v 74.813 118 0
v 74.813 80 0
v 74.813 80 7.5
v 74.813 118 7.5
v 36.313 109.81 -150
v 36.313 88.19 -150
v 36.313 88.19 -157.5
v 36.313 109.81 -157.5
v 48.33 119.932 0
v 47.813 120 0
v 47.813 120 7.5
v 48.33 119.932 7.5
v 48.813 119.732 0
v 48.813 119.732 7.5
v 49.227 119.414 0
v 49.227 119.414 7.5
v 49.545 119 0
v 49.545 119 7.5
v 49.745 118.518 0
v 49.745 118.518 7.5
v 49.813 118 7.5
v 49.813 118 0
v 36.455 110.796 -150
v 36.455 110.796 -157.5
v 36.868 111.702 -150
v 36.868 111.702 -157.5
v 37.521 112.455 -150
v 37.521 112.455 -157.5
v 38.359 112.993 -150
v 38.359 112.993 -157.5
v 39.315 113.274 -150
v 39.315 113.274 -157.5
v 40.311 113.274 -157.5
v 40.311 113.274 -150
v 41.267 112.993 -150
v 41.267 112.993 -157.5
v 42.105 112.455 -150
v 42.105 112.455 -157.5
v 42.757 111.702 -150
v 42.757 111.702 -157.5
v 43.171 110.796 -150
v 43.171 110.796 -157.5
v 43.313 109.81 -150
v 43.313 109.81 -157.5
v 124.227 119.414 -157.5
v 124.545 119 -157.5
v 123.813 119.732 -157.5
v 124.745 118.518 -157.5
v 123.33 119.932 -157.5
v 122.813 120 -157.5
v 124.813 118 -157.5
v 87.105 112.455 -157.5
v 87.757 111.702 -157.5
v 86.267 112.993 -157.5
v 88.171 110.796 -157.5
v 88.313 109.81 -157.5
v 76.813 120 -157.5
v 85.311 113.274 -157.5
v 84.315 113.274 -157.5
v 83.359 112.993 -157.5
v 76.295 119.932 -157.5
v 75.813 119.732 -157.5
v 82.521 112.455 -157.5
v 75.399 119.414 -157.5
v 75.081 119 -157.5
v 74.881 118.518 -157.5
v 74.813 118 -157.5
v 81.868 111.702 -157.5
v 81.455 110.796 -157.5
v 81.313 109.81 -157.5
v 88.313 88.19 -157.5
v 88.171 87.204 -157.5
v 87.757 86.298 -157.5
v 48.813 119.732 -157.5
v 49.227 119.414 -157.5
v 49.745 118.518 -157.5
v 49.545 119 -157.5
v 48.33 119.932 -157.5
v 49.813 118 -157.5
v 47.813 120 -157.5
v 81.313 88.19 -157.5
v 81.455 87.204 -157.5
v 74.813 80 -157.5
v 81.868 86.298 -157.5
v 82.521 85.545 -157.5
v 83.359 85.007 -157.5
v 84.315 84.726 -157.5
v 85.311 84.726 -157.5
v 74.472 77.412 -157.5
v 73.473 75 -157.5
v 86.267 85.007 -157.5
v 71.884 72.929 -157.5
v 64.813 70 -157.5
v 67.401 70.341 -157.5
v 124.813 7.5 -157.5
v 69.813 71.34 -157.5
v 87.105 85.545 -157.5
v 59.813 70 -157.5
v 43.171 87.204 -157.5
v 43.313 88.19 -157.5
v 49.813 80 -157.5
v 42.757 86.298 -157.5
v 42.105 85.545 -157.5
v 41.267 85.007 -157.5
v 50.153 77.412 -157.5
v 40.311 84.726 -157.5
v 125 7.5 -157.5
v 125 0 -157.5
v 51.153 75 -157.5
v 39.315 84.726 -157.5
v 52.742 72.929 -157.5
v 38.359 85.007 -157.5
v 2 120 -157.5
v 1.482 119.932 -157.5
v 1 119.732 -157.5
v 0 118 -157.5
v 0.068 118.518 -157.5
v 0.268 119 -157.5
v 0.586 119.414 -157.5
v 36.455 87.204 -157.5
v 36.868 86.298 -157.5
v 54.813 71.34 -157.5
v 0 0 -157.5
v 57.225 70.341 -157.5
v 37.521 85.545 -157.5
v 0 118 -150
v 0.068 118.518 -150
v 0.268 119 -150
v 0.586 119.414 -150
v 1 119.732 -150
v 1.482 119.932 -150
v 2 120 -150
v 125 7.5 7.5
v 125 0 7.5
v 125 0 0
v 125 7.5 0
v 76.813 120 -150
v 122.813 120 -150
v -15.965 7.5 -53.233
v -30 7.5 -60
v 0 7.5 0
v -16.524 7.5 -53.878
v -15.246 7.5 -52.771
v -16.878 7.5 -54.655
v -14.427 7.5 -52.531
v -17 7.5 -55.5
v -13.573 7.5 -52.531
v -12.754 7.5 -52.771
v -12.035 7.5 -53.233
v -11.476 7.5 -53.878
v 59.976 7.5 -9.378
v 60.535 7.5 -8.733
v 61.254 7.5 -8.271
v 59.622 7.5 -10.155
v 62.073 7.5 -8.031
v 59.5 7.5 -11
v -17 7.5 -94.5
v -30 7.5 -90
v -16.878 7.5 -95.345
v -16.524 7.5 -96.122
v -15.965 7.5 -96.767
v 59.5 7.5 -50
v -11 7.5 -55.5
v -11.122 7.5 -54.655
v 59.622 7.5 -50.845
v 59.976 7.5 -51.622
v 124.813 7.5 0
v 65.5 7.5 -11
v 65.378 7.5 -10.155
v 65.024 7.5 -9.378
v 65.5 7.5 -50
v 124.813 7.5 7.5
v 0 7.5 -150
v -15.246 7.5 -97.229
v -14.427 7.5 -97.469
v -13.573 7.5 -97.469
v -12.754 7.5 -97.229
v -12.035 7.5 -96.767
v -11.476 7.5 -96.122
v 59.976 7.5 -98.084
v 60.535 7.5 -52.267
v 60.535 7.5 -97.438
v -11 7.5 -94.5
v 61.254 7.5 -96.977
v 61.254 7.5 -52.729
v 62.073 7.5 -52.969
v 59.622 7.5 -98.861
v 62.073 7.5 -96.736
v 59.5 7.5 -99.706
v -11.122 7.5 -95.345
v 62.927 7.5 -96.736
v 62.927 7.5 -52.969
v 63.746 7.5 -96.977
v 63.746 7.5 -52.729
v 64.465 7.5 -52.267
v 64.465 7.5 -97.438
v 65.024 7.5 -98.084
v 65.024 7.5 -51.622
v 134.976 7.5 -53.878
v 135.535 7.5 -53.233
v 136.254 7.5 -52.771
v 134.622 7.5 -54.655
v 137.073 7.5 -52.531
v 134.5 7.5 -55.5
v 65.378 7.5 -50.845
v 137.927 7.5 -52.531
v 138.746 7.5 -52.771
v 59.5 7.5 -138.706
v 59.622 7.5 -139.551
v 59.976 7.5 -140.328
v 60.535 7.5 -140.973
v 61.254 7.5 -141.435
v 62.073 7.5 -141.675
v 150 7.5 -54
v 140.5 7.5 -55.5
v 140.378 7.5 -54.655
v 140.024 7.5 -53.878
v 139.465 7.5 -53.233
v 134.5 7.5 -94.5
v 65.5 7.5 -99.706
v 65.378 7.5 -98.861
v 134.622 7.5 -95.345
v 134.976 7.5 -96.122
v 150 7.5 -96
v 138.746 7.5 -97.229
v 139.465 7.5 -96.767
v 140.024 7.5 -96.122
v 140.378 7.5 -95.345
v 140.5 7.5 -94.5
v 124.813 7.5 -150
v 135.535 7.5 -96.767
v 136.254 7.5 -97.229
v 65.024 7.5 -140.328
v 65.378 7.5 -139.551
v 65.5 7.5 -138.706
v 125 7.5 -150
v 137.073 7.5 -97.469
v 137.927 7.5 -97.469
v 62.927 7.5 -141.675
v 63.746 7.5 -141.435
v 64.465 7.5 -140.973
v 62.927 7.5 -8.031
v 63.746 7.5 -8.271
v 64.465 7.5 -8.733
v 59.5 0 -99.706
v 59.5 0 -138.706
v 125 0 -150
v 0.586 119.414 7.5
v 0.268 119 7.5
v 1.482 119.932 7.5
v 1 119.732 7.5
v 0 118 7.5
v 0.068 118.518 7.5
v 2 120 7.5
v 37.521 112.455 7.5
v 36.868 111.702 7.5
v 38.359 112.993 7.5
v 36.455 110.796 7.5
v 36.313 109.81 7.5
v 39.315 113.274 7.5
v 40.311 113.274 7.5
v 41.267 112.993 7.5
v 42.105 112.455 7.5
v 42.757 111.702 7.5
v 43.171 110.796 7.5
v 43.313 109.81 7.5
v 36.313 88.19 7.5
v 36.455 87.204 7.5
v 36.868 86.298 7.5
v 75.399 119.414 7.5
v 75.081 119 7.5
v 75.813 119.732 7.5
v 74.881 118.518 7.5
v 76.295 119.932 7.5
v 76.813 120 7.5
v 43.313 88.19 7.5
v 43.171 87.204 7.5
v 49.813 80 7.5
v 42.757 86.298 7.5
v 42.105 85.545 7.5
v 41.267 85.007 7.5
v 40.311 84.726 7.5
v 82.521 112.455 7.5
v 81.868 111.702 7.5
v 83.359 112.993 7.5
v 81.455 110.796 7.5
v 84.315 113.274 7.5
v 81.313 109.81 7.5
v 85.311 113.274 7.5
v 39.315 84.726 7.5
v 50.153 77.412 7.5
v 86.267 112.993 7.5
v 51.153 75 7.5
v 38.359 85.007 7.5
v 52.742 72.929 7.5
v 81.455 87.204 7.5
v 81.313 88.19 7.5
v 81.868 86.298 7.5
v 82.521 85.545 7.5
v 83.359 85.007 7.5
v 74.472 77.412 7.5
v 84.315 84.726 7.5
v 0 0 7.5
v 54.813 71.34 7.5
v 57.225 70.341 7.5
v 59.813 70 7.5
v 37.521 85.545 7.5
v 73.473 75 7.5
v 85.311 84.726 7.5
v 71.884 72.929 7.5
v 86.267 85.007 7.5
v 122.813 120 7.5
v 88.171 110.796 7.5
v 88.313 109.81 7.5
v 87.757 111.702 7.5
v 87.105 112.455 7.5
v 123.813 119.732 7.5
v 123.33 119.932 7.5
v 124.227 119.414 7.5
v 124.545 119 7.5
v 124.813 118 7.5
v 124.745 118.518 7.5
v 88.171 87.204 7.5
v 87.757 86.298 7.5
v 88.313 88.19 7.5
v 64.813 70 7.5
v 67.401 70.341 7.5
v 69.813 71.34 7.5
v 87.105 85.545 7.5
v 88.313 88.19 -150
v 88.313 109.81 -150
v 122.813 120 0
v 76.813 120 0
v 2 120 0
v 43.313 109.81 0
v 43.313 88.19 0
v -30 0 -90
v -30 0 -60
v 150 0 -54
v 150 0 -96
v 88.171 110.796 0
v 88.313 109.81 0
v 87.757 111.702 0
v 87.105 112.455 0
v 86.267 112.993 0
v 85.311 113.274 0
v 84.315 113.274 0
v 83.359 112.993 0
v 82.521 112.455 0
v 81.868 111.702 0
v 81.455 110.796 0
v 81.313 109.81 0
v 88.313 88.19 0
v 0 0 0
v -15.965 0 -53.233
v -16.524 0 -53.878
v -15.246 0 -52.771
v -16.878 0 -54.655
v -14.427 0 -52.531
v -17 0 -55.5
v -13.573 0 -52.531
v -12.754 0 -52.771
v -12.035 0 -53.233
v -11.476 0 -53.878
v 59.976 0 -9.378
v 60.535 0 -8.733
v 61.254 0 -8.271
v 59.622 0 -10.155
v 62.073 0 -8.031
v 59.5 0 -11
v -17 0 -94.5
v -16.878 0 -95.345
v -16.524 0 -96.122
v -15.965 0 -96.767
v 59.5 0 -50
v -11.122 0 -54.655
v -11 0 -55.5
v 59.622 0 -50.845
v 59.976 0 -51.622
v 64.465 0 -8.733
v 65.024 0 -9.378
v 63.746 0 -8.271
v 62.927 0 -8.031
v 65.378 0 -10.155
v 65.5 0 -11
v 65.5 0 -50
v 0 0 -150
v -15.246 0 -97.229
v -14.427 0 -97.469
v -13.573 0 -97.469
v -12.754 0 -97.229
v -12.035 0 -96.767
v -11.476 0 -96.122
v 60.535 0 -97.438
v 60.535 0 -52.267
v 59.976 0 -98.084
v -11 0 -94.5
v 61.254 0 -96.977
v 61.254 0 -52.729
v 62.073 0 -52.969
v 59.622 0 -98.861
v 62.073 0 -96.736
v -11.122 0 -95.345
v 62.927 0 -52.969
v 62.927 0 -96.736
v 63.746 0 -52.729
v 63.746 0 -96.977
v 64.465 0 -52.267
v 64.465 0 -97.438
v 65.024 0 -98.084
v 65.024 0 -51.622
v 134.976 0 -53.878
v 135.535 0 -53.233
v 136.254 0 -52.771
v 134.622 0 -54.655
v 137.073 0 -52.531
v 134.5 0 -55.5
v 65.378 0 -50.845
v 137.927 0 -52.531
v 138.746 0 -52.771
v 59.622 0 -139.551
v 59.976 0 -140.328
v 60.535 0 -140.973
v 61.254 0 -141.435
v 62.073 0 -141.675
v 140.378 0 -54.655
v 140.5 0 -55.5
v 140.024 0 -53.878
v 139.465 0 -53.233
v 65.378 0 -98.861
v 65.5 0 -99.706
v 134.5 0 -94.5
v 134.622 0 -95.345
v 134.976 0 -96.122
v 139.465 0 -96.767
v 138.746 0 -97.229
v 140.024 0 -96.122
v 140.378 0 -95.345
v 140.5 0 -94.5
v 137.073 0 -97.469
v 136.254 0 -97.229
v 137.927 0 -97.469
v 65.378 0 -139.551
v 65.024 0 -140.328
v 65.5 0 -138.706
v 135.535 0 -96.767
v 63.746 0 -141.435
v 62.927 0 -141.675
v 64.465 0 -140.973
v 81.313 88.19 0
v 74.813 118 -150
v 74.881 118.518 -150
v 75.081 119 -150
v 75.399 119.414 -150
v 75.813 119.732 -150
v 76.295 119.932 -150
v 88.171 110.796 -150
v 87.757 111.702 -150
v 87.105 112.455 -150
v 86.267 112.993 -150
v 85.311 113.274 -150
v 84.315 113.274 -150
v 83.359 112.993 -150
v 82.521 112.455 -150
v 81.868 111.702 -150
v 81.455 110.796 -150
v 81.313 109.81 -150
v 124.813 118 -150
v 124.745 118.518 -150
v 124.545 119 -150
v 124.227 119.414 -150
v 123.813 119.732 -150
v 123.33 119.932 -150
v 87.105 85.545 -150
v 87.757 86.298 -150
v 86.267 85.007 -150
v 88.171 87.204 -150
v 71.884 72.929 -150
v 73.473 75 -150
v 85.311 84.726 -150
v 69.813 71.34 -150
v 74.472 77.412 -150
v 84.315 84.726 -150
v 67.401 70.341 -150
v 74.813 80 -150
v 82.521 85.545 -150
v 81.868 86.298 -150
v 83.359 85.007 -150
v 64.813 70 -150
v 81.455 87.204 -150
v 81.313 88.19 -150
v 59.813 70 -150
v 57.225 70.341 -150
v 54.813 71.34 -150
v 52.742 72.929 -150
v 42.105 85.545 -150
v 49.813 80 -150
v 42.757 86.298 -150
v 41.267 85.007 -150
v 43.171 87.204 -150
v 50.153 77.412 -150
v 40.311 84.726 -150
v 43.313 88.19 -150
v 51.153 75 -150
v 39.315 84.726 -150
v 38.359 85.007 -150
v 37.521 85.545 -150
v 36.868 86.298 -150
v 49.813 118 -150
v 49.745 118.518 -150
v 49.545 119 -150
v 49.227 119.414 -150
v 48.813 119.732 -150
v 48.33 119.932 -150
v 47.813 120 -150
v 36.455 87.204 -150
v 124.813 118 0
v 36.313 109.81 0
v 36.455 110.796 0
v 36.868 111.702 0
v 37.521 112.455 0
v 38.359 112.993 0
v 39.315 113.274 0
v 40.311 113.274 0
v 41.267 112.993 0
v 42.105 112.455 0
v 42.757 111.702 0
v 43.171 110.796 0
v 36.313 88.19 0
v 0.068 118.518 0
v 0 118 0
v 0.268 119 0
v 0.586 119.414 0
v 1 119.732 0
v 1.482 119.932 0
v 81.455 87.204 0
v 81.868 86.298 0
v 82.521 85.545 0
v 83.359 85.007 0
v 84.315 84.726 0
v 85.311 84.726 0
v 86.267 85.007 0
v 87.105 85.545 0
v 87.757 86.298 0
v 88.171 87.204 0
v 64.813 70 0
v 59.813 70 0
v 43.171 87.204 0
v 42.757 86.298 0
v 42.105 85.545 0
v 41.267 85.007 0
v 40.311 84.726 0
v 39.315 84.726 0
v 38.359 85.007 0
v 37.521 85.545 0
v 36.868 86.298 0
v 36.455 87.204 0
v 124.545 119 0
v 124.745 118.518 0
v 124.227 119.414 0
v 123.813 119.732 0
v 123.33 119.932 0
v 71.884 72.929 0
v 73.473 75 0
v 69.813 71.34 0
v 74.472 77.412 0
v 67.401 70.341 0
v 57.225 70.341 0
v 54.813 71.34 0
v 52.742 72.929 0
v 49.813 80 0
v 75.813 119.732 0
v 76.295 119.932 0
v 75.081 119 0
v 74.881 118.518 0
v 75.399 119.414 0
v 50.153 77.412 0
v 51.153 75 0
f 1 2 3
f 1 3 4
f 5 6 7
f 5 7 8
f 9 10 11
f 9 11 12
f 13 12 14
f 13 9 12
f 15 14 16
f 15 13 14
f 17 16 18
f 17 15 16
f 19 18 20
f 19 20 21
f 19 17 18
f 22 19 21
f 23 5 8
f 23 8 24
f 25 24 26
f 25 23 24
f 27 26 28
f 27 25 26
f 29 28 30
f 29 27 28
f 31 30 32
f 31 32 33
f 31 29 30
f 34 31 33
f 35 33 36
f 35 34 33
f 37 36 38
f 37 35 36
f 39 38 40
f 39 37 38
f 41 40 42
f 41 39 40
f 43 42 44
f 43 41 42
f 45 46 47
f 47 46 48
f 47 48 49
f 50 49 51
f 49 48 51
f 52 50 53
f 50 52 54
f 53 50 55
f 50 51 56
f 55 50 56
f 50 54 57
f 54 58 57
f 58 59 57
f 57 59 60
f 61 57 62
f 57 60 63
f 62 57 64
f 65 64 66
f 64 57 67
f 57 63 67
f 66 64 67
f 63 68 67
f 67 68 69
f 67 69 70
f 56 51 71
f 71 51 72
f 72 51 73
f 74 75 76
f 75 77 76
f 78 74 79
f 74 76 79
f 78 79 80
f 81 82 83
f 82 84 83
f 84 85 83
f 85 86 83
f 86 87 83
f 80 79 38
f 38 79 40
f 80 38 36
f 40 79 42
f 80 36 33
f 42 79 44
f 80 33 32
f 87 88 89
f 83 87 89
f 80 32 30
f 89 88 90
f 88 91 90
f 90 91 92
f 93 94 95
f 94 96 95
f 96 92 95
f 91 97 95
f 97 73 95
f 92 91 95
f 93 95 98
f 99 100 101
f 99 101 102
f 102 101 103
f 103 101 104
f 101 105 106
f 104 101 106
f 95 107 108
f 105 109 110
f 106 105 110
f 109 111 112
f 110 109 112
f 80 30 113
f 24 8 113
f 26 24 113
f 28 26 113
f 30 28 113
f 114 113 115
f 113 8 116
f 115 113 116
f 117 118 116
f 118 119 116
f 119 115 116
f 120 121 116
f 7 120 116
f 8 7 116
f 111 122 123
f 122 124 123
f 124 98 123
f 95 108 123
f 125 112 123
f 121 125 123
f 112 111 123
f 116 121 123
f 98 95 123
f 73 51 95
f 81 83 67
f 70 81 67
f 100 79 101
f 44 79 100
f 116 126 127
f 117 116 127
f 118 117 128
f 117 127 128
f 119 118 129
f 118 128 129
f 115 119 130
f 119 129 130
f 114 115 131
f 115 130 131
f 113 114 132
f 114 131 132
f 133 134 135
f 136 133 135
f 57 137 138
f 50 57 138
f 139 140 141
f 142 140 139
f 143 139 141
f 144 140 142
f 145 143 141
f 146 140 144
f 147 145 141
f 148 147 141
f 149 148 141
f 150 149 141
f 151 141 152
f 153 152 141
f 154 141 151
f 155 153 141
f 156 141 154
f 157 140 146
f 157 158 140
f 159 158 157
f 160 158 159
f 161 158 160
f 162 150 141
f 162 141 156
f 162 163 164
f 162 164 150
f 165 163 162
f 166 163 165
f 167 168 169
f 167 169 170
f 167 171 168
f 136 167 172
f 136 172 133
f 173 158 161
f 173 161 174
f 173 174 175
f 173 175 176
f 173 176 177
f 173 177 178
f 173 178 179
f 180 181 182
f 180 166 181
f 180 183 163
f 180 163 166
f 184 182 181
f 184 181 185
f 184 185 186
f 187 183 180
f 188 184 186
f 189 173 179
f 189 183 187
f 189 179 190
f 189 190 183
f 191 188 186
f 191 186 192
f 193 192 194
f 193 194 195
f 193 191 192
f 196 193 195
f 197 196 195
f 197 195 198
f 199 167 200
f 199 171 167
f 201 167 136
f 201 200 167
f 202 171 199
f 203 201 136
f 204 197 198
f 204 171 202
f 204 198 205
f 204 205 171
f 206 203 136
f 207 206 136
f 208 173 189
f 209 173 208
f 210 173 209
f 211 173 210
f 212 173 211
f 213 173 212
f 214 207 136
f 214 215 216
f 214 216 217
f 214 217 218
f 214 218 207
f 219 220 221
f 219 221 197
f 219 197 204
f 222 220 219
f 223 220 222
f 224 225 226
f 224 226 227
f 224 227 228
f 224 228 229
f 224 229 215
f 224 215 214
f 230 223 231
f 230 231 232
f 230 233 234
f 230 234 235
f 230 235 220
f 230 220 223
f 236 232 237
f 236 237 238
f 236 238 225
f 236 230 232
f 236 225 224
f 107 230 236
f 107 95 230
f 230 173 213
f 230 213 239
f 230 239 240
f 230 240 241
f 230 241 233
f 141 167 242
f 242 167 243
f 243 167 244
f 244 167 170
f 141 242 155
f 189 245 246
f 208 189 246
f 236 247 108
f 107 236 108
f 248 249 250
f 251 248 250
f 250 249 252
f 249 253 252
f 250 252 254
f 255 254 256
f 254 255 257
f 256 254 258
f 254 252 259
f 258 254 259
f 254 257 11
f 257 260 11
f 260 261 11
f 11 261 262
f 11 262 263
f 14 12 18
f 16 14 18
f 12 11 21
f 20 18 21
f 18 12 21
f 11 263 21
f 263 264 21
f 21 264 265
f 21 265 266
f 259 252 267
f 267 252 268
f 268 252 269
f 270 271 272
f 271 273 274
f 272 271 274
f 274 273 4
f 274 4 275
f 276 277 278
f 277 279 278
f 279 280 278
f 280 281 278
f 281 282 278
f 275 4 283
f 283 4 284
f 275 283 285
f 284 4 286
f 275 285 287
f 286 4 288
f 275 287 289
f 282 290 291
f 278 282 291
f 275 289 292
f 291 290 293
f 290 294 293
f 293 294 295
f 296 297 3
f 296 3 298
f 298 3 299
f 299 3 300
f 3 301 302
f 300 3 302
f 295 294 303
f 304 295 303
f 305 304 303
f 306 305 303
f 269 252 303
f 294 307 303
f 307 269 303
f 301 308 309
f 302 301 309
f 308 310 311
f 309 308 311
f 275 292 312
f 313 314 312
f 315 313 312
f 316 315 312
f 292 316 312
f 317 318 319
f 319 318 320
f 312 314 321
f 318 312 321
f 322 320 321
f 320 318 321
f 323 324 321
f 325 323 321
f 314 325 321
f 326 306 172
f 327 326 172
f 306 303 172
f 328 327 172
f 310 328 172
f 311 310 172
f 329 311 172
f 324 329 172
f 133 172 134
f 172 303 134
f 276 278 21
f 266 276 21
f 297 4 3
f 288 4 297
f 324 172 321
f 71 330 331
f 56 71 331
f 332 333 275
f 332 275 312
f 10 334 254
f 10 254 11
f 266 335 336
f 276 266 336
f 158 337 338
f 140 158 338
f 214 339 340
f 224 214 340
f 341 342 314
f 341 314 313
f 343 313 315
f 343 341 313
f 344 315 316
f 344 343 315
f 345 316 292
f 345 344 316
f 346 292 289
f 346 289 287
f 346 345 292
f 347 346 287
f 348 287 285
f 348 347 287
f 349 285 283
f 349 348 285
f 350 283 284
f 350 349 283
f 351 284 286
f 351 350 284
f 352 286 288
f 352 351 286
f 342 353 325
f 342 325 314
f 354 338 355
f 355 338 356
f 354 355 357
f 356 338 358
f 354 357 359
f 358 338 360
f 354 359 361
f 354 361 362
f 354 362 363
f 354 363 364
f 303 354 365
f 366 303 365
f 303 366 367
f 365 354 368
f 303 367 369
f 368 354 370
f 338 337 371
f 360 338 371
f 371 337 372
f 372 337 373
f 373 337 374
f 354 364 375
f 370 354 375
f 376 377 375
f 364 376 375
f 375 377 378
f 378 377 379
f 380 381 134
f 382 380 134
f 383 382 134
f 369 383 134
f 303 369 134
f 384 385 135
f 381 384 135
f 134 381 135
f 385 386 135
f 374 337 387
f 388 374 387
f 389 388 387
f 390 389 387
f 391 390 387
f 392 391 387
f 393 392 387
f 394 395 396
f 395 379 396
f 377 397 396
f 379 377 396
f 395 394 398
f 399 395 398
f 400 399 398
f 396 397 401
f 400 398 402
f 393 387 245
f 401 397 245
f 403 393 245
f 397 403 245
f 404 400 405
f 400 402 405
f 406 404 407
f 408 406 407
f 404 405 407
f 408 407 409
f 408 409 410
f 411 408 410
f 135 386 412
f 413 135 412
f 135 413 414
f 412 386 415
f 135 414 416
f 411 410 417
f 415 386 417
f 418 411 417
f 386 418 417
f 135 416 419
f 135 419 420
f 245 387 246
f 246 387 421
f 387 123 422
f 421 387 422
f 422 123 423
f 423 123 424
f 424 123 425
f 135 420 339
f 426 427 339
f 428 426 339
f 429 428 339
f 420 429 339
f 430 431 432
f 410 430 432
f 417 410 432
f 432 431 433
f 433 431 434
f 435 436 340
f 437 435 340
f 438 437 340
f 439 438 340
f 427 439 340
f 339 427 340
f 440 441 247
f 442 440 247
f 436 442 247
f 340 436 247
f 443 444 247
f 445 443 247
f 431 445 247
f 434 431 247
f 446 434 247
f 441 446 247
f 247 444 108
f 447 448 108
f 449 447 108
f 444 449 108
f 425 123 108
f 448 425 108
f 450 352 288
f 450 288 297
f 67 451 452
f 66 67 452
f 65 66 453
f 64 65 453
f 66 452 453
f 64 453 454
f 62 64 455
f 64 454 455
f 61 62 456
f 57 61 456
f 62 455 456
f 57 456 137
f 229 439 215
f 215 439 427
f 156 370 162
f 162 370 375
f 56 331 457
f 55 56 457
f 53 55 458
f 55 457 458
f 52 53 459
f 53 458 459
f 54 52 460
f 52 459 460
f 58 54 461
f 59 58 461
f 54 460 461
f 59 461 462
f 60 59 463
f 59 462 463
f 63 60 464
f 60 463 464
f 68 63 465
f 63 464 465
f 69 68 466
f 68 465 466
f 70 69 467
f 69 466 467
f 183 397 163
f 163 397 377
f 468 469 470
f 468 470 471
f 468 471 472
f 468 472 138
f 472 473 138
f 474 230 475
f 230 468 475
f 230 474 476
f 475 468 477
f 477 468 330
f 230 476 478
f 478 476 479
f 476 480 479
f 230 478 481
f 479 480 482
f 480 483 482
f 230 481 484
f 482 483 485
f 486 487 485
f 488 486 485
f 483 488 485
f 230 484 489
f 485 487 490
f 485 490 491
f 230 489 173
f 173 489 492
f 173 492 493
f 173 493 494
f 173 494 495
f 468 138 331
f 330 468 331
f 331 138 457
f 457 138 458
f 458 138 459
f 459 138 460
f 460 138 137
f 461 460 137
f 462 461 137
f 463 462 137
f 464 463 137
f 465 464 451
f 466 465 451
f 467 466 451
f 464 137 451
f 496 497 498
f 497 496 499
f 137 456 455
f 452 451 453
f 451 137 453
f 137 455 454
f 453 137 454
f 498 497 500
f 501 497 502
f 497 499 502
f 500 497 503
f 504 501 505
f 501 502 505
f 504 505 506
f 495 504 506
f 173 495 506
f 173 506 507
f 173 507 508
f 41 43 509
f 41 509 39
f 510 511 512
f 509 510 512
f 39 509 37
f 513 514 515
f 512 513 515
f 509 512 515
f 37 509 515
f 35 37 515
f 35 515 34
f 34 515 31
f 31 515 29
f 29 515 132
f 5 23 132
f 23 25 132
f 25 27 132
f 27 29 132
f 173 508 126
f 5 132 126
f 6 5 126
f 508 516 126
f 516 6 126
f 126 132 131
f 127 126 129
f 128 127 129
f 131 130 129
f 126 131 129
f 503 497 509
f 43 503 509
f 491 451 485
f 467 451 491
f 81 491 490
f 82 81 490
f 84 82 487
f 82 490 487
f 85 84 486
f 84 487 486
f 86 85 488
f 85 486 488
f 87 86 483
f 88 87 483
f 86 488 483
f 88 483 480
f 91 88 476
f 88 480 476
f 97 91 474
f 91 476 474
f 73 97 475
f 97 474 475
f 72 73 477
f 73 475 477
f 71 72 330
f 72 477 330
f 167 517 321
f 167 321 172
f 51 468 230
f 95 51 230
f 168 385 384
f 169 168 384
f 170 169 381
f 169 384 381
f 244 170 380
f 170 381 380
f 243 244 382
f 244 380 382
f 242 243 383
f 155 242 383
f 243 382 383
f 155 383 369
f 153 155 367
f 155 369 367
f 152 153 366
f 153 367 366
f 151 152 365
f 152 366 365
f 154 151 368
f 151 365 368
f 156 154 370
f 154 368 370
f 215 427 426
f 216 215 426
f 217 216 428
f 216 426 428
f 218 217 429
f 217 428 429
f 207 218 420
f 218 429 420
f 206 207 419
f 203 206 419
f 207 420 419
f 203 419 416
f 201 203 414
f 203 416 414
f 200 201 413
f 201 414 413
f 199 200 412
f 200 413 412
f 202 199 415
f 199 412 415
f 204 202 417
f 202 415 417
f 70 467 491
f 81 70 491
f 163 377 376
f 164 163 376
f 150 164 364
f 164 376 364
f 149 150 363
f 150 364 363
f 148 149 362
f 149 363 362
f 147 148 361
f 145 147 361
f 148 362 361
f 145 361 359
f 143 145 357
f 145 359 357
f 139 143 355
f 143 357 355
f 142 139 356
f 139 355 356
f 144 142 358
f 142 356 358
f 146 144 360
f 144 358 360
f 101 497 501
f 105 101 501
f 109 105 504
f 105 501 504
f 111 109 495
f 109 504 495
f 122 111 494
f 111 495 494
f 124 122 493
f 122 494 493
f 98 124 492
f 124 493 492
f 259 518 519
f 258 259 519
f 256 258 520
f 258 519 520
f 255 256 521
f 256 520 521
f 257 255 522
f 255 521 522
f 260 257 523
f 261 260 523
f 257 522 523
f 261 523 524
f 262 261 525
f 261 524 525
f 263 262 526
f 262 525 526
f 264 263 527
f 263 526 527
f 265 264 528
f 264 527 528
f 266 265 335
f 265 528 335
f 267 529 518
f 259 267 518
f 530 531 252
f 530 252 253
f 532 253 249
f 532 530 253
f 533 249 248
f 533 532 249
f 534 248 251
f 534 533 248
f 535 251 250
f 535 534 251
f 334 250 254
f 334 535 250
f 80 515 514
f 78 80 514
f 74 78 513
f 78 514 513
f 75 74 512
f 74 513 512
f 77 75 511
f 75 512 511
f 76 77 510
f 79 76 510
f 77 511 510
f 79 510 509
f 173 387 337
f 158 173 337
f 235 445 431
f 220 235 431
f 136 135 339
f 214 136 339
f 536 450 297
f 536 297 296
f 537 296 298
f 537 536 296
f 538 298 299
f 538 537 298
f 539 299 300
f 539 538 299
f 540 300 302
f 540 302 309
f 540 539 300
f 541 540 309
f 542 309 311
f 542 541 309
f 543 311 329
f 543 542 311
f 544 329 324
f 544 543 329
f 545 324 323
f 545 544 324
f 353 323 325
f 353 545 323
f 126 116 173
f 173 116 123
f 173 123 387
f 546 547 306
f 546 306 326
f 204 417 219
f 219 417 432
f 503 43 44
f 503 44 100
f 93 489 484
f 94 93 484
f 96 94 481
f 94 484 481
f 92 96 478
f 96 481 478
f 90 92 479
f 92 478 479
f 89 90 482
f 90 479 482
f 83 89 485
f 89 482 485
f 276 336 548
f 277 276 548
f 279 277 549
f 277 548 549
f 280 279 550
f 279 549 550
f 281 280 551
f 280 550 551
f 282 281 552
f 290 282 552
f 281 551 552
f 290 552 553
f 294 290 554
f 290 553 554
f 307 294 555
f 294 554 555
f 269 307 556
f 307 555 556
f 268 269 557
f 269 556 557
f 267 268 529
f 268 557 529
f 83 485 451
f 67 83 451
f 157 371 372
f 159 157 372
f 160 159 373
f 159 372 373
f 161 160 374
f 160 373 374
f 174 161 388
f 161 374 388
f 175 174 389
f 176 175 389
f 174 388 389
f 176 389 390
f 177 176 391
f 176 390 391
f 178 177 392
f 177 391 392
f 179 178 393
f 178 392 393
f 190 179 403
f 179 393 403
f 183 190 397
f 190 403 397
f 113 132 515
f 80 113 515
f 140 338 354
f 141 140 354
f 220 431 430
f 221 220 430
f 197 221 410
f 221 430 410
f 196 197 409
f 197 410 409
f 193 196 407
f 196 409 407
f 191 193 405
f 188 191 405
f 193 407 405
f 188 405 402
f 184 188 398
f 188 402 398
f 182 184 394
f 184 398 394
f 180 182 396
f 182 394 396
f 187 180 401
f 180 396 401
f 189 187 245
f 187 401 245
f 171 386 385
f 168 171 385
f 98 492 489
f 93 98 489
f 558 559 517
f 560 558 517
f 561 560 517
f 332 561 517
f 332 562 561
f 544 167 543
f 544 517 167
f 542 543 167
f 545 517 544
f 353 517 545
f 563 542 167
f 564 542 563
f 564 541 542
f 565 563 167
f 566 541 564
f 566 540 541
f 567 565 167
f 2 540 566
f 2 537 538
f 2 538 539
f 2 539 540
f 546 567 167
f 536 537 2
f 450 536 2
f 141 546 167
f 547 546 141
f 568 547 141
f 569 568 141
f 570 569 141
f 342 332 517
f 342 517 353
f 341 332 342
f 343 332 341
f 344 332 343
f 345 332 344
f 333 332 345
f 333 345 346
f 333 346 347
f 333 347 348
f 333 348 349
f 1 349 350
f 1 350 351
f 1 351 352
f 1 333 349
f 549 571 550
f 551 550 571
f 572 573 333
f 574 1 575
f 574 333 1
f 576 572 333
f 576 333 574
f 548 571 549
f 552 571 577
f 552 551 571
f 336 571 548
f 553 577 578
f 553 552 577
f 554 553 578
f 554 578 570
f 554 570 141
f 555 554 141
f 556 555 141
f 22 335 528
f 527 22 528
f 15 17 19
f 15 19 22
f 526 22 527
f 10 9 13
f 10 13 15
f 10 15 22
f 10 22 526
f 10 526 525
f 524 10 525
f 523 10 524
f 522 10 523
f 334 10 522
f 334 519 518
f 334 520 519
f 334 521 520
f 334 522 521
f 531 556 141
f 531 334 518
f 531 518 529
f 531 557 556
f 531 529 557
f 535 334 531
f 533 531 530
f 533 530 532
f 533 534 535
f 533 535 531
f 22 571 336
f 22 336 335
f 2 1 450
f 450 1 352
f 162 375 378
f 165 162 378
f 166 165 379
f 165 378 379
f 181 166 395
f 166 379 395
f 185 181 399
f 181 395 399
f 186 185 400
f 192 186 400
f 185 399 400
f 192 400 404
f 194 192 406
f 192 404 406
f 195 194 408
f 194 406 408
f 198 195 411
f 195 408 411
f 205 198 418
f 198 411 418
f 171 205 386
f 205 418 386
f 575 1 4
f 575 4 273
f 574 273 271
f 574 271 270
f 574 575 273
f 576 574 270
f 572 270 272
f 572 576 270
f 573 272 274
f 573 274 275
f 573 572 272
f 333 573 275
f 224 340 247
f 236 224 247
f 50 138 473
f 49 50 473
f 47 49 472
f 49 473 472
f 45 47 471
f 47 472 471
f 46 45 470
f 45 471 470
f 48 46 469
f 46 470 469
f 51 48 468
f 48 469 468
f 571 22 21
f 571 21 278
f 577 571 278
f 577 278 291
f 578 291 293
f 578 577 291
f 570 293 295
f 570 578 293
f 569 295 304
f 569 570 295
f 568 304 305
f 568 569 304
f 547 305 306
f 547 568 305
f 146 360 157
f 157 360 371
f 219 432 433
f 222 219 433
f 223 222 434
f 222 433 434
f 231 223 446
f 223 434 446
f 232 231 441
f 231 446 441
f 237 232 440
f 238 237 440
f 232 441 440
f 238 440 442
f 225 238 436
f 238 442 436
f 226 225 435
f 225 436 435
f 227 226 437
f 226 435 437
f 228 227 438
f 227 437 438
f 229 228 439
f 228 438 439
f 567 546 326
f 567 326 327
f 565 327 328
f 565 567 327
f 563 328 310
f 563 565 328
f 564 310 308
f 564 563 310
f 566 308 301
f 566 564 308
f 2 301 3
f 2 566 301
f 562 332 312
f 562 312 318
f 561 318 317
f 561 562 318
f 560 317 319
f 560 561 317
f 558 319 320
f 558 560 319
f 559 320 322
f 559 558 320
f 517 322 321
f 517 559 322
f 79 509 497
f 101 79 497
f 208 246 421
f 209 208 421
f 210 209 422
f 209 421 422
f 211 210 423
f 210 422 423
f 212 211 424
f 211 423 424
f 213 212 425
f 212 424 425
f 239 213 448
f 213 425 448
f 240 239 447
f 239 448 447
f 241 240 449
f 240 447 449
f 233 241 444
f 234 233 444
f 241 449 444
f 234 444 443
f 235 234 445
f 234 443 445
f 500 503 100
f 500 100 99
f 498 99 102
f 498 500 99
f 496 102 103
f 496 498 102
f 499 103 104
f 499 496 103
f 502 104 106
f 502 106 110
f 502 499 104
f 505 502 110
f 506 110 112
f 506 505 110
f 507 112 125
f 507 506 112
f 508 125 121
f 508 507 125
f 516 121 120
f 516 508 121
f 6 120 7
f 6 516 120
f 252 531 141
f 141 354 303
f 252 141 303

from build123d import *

# Parameters (mm, degrees)
BOSS_EXTRUDE6_DEPTH = 7.5
BOSS_EXTRUDE7_DEPTH = 7.5


with BuildPart() as part:
    # Sketch1 → Boss-Extrude6 (new body)
    with BuildSketch(Plane(origin=(0, 0, 0), x_dir=(1, 0, 0), z_dir=(0, 1, 0))):
        Polygon((0, -7.5), (125, -7.5), (125, 0), (150, 54), (150, 96), (125, 150), (125, 157.5), (0, 157.5), (0, 150), (-30, 90), (-30, 60), (0, 0), align=None)
        with BuildLine():
            Line((134.5, 55.5), (134.5, 94.5))
            ThreePointArc((134.5, 94.5), (137.5, 97.5), (140.5, 94.5))
            Line((140.5, 94.5), (140.5, 55.5))
            ThreePointArc((140.5, 55.5), (137.5, 52.5), (134.5, 55.5))
        make_face(mode=Mode.SUBTRACT)
        with BuildLine():
            Line((-17, 55.5), (-17, 94.5))
            ThreePointArc((-17, 94.5), (-14, 97.5), (-11, 94.5))
            Line((-11, 94.5), (-11, 55.5))
            ThreePointArc((-11, 55.5), (-14, 52.5), (-17, 55.5))
        make_face(mode=Mode.SUBTRACT)
        with BuildLine():
            Line((59.5, 11), (59.5, 50))
            ThreePointArc((59.5, 50), (62.5, 53), (65.5, 50))
            Line((65.5, 50), (65.5, 11))
            ThreePointArc((65.5, 11), (62.5, 8), (59.5, 11))
        make_face(mode=Mode.SUBTRACT)
        with BuildLine():
            Line((65.5, 138.705746838), (65.5, 99.705746838))
            ThreePointArc((65.5, 99.705746838), (62.5, 96.705746838), (59.5, 99.705746838))
            Line((59.5, 99.705746838), (59.5, 138.705746838))
            ThreePointArc((59.5, 138.705746838), (62.5, 141.705746839), (65.5, 138.705746838))
        make_face(mode=Mode.SUBTRACT)
    extrude(amount=BOSS_EXTRUDE6_DEPTH)

    # Sketch2 → Boss-Extrude7 (add)
    with BuildSketch(Plane.XY):
        with BuildLine():
            Line((0, 0), (0, 118))
            ThreePointArc((0, 118), (0.585786438, 119.414213562), (2, 120))
            Line((2, 120), (47.812758192, 120))
            ThreePointArc((47.812758192, 120), (49.226971755, 119.414213562), (49.812758192, 118))
            Line((49.812758192, 118), (49.812758192, 80))
            ThreePointArc((49.812758192, 80), (52.74169038, 72.928932188), (59.812758192, 70))
            Line((59.812758192, 70), (64.812758192, 70))
            ThreePointArc((64.812758192, 70), (71.883826004, 72.928932188), (74.812758192, 80))
            Line((74.812758192, 80), (74.812758192, 118))
            ThreePointArc((74.812758192, 118), (75.39854463, 119.414213562), (76.812758192, 120))
            Line((76.812758192, 120), (122.812758192, 120))
            ThreePointArc((122.812758192, 120), (124.226971755, 119.414213562), (124.812758192, 118))
            Line((124.812758192, 118), (124.812758192, 0))
            Line((124.812758192, 0), (0, 0))
        make_face()
        with BuildLine():
            Line((36.312758192, 88.190430343), (36.312758192, 109.809569657))
            ThreePointArc((36.312758192, 109.809569657), (39.812758192, 113.309569657), (43.312758192, 109.809569657))
            Line((43.312758192, 109.809569657), (43.312758192, 88.190430343))
            ThreePointArc((43.312758192, 88.190430343), (39.812758192, 84.690430343), (36.312758192, 88.190430343))
        make_face(mode=Mode.SUBTRACT)
        with BuildLine():
            Line((88.312758192, 88.190430343), (88.312758192, 109.809569657))
            ThreePointArc((88.312758192, 109.809569657), (84.812758192, 113.309569657), (81.312758192, 109.809569657))
            Line((81.312758192, 109.809569657), (81.312758192, 88.190430343))
            ThreePointArc((81.312758192, 88.190430343), (84.812758192, 84.690430343), (88.312758192, 88.190430343))
        make_face(mode=Mode.SUBTRACT)
    boss_extrude7 = extrude(amount=BOSS_EXTRUDE7_DEPTH)

    # Mirror1: Boss-Extrude7 across plane
    add(boss_extrude7.mirror(Plane(origin=(0, 0, -75), x_dir=(1, 0, 0), z_dir=(0, 0, -1))))


solid = part.part
